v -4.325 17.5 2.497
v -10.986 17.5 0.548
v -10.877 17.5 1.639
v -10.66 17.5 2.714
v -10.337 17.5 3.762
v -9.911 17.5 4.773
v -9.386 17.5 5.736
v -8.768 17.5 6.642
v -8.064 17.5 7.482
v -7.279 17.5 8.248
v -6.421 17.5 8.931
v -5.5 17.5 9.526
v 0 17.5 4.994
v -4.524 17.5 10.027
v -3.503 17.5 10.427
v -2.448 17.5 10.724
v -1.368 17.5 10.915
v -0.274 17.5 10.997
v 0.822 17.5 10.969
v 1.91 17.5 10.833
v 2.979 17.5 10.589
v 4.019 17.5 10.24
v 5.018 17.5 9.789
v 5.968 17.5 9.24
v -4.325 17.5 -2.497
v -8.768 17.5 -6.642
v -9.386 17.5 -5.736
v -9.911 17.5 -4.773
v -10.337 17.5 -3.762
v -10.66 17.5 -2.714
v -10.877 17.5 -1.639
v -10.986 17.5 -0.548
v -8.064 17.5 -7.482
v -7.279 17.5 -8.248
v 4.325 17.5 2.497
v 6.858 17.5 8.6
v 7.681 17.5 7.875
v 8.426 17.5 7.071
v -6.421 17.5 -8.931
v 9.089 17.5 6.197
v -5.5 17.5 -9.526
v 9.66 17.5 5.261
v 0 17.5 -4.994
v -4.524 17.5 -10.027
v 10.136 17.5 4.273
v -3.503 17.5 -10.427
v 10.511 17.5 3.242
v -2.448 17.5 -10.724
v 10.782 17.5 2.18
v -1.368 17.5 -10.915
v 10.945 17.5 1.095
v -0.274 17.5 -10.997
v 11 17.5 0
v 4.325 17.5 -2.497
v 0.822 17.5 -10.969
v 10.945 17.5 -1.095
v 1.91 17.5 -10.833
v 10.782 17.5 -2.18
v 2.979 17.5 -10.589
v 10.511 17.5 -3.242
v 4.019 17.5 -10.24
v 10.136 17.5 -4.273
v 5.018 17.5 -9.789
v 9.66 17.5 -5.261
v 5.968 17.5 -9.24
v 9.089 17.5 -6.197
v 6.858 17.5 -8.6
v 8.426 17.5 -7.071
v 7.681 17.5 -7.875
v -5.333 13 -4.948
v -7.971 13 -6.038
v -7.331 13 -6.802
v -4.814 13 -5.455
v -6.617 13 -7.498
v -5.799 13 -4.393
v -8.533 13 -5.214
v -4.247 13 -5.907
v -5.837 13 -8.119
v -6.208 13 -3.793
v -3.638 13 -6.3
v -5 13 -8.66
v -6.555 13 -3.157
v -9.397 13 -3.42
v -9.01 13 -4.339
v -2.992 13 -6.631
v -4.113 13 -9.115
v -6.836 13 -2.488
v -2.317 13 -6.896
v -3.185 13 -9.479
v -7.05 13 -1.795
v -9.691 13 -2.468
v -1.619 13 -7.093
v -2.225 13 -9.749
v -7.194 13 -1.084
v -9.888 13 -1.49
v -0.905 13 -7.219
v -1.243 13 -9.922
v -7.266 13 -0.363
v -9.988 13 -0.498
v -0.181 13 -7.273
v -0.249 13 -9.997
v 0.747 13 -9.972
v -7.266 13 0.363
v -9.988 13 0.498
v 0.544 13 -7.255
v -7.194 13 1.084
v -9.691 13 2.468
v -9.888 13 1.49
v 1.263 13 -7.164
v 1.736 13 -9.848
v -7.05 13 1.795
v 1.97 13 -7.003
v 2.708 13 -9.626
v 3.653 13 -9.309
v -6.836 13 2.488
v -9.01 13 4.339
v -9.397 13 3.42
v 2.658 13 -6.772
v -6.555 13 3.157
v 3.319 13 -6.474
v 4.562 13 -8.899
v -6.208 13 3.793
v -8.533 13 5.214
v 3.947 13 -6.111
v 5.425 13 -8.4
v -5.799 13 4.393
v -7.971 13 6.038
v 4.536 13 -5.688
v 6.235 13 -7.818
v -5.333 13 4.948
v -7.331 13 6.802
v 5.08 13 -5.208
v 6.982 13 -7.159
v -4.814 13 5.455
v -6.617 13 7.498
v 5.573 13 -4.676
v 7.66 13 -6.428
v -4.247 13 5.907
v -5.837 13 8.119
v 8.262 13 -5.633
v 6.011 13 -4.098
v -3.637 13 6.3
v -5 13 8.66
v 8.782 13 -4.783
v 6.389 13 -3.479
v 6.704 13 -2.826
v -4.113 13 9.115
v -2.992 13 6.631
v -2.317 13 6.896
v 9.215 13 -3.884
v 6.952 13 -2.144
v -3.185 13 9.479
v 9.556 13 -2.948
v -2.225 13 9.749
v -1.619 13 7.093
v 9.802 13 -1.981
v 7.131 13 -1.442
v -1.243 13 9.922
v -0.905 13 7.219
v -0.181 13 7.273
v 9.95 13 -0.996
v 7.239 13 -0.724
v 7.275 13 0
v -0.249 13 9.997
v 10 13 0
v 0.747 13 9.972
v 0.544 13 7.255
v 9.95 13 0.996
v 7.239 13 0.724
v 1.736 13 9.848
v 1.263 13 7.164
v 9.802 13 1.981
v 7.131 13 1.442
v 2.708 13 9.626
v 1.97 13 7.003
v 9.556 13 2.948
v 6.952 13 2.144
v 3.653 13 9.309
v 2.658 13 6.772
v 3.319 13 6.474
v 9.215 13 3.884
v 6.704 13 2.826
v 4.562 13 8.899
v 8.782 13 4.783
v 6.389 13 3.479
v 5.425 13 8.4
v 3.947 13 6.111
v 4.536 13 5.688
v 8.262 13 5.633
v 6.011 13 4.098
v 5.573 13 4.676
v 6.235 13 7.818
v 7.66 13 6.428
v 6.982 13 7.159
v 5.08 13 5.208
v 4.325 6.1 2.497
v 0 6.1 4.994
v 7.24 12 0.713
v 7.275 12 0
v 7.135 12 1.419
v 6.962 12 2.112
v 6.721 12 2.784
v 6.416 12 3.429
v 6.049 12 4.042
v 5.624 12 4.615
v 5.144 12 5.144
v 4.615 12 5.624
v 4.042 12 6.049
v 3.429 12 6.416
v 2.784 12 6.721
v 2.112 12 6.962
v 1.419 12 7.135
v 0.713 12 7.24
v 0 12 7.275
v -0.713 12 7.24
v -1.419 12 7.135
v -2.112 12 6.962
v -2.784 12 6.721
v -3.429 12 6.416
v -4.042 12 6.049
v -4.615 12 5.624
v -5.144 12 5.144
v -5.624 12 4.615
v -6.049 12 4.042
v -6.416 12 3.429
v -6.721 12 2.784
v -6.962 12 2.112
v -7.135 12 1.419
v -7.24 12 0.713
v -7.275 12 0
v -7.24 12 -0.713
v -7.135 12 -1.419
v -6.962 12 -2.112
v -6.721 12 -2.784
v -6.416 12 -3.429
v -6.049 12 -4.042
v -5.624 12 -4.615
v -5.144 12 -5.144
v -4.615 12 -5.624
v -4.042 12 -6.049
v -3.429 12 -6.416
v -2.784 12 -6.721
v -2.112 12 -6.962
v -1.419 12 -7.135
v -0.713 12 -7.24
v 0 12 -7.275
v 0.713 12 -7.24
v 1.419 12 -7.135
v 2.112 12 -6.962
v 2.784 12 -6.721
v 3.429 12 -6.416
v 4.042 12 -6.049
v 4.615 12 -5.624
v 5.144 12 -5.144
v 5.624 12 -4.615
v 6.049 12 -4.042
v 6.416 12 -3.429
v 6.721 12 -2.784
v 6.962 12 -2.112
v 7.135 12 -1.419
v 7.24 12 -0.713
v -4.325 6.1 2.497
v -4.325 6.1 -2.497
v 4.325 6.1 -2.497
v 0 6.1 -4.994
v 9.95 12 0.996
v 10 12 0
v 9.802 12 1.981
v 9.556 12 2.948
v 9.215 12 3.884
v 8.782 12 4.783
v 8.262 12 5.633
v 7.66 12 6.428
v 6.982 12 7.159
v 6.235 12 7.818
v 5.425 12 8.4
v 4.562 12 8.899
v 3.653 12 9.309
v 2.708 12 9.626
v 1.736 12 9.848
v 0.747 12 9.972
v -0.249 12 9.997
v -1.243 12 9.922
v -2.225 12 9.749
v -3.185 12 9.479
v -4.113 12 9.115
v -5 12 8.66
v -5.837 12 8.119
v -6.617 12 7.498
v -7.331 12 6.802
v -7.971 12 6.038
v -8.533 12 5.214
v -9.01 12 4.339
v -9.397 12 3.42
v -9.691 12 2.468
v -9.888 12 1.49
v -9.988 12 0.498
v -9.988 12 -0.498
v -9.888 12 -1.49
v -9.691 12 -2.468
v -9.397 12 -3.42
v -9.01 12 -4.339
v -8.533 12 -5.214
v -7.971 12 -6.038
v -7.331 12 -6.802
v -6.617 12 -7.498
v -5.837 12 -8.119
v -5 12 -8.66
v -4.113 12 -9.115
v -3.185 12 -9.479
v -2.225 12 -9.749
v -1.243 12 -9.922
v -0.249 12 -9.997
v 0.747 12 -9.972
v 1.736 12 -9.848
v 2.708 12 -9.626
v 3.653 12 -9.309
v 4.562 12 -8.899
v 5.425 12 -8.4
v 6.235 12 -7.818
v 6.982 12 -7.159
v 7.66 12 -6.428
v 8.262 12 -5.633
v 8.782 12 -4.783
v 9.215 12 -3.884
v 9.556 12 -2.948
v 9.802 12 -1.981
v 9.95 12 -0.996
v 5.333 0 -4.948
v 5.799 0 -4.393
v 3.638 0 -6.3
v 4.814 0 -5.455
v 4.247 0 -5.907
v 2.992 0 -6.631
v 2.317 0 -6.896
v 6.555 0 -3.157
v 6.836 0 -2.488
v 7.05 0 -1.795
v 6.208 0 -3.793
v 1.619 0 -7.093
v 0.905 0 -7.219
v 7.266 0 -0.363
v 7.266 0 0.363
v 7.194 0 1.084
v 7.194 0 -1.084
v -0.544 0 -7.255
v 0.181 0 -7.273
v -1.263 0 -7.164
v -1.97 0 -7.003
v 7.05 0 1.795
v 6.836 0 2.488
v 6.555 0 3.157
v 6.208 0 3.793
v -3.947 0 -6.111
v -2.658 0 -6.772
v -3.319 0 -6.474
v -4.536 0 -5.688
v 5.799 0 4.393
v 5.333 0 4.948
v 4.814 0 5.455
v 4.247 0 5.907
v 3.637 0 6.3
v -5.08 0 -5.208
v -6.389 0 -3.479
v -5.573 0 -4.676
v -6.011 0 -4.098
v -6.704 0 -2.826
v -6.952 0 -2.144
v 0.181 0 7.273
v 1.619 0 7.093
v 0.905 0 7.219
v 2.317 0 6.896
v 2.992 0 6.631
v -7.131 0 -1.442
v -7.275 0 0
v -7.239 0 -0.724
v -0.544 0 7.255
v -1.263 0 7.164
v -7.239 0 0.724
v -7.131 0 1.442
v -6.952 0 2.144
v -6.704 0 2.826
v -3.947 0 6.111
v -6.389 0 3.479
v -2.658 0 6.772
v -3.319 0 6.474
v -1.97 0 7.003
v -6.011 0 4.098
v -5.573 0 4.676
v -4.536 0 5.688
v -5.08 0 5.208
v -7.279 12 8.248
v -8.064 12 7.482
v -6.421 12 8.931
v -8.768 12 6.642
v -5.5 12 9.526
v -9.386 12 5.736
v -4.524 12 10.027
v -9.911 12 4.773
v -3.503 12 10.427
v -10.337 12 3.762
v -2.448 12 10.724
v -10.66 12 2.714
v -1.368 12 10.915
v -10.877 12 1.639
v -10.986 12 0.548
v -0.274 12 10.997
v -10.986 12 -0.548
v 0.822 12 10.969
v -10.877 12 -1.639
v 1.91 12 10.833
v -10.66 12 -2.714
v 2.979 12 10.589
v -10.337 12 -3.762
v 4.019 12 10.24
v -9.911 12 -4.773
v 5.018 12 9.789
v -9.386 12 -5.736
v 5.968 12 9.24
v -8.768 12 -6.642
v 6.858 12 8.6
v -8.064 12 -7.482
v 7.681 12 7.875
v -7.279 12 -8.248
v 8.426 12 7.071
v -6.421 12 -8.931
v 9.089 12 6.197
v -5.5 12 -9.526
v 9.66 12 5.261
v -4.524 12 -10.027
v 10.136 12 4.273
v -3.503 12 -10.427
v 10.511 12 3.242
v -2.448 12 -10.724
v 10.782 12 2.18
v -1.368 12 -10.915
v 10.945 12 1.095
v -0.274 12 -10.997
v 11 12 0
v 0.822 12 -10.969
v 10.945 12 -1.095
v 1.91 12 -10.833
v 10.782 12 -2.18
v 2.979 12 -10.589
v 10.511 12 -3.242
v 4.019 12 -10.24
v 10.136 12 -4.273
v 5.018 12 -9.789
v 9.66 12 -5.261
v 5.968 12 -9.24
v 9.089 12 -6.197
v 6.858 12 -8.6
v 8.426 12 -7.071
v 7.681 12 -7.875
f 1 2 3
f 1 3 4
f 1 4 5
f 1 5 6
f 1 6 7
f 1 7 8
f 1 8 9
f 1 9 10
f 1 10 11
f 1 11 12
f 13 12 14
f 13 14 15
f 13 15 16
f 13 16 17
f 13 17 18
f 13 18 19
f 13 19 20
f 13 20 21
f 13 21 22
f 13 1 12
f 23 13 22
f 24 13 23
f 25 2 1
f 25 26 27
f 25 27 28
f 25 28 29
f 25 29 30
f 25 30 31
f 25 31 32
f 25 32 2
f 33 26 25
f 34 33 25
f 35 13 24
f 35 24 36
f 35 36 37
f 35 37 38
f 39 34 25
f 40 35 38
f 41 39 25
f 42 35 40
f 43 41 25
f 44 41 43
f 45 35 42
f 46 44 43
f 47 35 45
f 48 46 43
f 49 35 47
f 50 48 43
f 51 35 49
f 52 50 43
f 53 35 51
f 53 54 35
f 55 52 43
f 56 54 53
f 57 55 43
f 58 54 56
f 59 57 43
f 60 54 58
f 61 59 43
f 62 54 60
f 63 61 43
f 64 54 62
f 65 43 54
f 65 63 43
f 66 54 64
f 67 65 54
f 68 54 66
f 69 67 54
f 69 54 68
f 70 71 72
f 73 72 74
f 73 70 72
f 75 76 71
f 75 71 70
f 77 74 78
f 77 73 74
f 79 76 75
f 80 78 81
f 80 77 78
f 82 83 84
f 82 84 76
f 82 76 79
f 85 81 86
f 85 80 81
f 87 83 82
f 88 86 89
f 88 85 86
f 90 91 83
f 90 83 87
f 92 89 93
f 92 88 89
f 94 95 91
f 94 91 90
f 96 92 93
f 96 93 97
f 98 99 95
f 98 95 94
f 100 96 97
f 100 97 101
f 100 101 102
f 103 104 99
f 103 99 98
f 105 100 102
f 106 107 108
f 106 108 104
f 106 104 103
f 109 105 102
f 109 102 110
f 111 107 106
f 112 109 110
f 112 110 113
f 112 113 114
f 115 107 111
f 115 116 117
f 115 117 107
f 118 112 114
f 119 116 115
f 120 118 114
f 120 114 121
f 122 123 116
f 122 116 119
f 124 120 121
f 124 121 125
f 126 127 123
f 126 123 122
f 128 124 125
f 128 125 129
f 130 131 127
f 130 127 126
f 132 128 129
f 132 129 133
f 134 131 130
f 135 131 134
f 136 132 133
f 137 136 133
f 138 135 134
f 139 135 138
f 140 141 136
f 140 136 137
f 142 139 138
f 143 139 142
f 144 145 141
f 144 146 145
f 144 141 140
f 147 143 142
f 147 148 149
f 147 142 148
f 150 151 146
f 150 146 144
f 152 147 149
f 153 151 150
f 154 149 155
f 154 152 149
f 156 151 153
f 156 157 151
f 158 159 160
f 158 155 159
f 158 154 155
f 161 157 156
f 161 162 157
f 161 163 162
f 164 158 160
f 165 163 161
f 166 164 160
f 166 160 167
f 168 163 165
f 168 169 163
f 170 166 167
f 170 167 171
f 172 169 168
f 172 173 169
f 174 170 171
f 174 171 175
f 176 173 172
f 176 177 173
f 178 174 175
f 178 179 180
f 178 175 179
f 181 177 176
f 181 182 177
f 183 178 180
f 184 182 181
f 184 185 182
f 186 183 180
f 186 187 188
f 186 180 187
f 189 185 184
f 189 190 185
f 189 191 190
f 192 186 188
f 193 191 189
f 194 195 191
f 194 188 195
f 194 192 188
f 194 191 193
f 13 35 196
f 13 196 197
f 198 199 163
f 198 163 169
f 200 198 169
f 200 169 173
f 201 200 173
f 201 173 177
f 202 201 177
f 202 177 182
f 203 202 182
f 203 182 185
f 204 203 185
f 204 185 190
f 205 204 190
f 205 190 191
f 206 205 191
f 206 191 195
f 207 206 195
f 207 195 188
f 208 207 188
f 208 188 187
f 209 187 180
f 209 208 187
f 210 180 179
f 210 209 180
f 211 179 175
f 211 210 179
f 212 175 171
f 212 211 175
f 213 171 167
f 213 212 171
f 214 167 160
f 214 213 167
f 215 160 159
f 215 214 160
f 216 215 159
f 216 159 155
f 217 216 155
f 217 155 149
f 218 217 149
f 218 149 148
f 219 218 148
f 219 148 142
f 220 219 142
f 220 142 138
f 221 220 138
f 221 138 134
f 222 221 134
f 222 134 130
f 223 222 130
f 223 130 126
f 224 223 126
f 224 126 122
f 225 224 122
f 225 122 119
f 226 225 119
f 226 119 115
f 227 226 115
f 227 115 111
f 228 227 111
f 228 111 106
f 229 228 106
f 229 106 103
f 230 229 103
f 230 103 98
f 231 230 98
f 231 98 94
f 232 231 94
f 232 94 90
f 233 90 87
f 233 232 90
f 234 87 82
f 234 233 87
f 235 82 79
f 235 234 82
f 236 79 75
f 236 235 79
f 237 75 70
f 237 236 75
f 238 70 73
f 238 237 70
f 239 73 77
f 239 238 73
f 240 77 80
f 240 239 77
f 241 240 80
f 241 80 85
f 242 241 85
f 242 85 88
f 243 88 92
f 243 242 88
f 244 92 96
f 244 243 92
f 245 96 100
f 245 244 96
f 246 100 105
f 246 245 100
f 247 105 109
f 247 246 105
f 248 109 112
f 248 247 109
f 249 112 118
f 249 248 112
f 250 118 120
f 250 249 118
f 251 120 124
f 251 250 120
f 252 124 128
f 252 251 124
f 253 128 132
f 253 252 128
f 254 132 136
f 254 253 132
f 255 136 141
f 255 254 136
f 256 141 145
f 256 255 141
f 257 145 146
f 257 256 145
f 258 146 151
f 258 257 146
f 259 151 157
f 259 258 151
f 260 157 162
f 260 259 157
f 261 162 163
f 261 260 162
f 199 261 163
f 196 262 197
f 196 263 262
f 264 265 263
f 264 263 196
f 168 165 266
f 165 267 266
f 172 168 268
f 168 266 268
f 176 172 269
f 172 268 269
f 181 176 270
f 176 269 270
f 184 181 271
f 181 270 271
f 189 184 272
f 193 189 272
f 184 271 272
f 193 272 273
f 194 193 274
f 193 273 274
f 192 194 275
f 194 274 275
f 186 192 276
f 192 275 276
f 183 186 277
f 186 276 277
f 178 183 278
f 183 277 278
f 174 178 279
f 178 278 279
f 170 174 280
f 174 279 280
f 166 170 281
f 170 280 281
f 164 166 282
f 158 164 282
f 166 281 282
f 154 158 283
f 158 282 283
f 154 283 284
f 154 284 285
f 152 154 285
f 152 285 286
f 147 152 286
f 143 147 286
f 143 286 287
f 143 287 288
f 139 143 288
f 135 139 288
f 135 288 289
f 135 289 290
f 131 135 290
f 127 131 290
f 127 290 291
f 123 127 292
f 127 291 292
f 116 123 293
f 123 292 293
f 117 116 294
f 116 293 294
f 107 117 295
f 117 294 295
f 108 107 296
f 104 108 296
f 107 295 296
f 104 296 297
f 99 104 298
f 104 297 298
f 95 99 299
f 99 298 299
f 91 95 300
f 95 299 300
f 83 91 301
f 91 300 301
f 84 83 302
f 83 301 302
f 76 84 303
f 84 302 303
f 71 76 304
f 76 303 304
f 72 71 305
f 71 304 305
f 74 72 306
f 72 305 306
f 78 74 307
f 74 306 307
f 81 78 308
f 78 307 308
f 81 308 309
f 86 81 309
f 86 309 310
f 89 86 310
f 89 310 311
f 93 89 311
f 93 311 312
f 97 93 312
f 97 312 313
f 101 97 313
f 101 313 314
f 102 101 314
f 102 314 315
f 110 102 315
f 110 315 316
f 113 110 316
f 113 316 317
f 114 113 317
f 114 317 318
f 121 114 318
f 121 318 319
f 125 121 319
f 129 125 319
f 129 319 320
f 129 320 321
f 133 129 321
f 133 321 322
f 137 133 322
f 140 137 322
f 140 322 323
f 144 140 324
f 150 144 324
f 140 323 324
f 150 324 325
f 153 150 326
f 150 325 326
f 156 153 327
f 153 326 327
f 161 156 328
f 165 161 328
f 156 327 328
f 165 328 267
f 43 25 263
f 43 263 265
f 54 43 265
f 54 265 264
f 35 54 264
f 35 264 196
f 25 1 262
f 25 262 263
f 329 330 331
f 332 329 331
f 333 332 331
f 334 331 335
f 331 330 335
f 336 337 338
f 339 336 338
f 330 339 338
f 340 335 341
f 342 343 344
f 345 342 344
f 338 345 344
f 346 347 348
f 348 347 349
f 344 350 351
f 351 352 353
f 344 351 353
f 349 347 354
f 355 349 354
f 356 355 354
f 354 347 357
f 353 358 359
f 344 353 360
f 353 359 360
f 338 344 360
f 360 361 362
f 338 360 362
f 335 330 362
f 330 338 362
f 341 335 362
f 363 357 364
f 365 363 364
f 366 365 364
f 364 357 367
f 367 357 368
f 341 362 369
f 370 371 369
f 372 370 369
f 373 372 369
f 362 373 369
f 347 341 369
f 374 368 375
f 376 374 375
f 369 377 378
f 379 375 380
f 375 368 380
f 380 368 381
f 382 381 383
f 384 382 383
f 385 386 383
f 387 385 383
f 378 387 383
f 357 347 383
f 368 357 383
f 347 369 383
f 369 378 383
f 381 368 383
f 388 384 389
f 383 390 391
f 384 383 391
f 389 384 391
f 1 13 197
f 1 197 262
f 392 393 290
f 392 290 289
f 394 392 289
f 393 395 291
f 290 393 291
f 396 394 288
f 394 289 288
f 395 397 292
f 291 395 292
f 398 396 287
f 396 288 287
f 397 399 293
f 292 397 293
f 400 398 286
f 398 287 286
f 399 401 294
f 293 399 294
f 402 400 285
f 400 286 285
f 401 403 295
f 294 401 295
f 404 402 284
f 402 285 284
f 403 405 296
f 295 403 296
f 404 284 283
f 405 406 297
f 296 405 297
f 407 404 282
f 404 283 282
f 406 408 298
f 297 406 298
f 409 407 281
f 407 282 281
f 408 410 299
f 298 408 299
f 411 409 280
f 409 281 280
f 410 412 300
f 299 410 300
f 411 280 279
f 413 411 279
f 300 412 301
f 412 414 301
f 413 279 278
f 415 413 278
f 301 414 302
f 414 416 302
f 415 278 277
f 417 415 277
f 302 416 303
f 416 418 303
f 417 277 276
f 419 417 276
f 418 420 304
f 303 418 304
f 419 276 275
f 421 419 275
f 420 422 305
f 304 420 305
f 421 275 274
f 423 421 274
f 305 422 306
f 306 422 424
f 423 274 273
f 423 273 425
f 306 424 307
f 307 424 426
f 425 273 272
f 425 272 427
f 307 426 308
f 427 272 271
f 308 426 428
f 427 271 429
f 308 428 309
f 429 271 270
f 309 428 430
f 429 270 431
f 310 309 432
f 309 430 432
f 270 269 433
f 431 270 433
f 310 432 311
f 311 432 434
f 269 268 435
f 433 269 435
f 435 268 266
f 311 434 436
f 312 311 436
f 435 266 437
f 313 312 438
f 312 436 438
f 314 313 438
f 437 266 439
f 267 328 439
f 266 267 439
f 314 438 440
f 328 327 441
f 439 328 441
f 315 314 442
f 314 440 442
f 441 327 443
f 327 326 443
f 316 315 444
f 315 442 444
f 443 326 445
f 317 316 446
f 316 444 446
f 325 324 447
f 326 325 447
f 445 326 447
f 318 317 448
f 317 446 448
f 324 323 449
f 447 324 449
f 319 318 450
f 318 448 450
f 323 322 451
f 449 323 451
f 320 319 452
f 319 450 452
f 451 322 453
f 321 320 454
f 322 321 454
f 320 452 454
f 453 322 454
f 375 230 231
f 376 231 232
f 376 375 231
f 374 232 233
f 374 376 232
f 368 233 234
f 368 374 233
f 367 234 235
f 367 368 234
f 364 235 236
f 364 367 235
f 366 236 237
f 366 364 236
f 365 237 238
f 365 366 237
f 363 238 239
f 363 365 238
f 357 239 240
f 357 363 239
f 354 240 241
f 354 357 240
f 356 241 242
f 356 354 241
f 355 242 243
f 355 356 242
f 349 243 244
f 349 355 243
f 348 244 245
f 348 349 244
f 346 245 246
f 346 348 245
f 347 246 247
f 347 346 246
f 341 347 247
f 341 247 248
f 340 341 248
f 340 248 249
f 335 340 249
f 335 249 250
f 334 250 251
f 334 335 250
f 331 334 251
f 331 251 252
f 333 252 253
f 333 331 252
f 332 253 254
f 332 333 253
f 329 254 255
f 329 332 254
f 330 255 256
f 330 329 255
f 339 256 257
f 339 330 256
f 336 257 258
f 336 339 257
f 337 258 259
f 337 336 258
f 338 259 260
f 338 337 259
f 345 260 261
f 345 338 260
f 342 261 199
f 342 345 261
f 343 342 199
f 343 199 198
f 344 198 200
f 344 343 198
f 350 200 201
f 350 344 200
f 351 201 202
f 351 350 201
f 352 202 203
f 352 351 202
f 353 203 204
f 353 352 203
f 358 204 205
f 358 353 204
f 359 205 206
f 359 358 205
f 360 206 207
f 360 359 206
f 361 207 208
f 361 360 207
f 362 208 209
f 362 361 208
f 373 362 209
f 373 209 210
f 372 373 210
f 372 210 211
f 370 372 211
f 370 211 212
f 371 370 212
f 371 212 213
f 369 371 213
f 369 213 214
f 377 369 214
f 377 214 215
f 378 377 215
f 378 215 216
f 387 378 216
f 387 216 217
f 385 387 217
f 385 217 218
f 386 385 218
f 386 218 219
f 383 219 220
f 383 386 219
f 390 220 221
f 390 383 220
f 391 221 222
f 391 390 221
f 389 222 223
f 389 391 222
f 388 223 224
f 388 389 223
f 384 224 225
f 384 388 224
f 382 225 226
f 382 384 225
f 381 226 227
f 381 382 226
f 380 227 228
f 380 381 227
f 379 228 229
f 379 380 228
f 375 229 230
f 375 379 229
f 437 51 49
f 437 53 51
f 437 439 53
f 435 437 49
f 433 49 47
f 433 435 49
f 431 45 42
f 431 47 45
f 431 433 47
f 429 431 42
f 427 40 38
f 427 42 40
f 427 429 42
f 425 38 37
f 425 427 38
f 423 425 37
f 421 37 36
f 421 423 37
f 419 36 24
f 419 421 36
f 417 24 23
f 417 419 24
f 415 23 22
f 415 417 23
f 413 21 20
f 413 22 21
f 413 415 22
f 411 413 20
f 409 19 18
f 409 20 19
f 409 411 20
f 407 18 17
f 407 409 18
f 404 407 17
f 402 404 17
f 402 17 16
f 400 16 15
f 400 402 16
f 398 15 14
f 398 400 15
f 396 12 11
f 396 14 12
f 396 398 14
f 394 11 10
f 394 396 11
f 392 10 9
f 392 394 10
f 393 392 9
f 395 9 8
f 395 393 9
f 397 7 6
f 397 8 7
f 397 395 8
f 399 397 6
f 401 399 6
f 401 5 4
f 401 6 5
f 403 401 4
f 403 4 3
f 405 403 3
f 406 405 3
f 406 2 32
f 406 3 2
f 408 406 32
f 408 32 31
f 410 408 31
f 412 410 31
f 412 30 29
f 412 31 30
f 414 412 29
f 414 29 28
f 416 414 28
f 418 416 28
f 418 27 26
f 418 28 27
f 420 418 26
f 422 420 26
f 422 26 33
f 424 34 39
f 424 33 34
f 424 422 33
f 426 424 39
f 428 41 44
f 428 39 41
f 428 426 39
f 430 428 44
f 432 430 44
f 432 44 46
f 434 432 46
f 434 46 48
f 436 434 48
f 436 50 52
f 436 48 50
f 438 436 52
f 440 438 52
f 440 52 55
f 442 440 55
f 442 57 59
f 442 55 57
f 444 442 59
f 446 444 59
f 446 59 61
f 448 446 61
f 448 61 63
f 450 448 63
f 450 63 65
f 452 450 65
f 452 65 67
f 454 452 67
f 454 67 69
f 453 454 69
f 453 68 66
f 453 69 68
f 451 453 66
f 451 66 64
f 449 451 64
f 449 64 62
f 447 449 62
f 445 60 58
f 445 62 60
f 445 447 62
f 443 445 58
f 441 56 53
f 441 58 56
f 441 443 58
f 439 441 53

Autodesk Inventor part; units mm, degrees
ref_plane "YZ Plane" through (0, 0, 0) normal (1, 0, 0) x (0, 1, 0)
ref_plane "XZ Plane" through (0, 0, 0) normal (0, 1, 0) x (-1, 0, 0)
ref_plane "XY Plane" through (0, 0, 0) normal (0, 0, 1) x (1, 0, 0)
sketch "Boceto1" plane through (0, 0, 0) normal (0, 1, 0) x (-1, 0, 0)
  circle A0 centre (0, 0) radius 7.275
  dimension "d0" = 14.55
extrude "Extrusión1" add sketch "Boceto1" along normal blind 12
sketch "Boceto2" plane through (0, 12, 0) normal (0, 1, 0) x (1, 0, 0)
  circle A0 centre (0, 0) radius 11
  dimension "d3" = 22
extrude "Extrusión2" add sketch "Boceto2" along normal blind 5.5
sketch "Boceto3" plane through (0, 17.5, 0) normal (0, 1, 0) x (1, 0, 0)
  line L0 (0, 0) -> (-4.325, 0)
  line L1 (-4.325, 2.497) -> (0, 4.9941)
  line L2 (0, 4.9941) -> (4.325, 2.497)
  line L3 (4.325, 2.497) -> (4.325, -2.497)
  line L4 (4.325, -2.497) -> (0, -4.9941)
  line L5 (0, -4.9941) -> (-4.325, -2.497)
  line L6 (-4.325, -2.497) -> (-4.325, 2.497)
  dimension "d6" = 4.325
extrude "Extrusión3" cut sketch "Boceto3" against normal blind 11.4
thread "Rosca1" size "M15x1.5" class "6g" standard "ANSI Metric M Profile" length 9
sketch "Boceto4" plane through (0, 12, 0) normal (0, -1, 0) x (1, 0, 0)
  circle A0 centre (0, 0) radius 7.275
  circle A1 centre (0, 0) radius 10
  dimension "d11" = 20
extrude "Extrusión4" cut sketch "Boceto4" against normal blind 1
properties part number "Tuerca_pieza_conectores"
